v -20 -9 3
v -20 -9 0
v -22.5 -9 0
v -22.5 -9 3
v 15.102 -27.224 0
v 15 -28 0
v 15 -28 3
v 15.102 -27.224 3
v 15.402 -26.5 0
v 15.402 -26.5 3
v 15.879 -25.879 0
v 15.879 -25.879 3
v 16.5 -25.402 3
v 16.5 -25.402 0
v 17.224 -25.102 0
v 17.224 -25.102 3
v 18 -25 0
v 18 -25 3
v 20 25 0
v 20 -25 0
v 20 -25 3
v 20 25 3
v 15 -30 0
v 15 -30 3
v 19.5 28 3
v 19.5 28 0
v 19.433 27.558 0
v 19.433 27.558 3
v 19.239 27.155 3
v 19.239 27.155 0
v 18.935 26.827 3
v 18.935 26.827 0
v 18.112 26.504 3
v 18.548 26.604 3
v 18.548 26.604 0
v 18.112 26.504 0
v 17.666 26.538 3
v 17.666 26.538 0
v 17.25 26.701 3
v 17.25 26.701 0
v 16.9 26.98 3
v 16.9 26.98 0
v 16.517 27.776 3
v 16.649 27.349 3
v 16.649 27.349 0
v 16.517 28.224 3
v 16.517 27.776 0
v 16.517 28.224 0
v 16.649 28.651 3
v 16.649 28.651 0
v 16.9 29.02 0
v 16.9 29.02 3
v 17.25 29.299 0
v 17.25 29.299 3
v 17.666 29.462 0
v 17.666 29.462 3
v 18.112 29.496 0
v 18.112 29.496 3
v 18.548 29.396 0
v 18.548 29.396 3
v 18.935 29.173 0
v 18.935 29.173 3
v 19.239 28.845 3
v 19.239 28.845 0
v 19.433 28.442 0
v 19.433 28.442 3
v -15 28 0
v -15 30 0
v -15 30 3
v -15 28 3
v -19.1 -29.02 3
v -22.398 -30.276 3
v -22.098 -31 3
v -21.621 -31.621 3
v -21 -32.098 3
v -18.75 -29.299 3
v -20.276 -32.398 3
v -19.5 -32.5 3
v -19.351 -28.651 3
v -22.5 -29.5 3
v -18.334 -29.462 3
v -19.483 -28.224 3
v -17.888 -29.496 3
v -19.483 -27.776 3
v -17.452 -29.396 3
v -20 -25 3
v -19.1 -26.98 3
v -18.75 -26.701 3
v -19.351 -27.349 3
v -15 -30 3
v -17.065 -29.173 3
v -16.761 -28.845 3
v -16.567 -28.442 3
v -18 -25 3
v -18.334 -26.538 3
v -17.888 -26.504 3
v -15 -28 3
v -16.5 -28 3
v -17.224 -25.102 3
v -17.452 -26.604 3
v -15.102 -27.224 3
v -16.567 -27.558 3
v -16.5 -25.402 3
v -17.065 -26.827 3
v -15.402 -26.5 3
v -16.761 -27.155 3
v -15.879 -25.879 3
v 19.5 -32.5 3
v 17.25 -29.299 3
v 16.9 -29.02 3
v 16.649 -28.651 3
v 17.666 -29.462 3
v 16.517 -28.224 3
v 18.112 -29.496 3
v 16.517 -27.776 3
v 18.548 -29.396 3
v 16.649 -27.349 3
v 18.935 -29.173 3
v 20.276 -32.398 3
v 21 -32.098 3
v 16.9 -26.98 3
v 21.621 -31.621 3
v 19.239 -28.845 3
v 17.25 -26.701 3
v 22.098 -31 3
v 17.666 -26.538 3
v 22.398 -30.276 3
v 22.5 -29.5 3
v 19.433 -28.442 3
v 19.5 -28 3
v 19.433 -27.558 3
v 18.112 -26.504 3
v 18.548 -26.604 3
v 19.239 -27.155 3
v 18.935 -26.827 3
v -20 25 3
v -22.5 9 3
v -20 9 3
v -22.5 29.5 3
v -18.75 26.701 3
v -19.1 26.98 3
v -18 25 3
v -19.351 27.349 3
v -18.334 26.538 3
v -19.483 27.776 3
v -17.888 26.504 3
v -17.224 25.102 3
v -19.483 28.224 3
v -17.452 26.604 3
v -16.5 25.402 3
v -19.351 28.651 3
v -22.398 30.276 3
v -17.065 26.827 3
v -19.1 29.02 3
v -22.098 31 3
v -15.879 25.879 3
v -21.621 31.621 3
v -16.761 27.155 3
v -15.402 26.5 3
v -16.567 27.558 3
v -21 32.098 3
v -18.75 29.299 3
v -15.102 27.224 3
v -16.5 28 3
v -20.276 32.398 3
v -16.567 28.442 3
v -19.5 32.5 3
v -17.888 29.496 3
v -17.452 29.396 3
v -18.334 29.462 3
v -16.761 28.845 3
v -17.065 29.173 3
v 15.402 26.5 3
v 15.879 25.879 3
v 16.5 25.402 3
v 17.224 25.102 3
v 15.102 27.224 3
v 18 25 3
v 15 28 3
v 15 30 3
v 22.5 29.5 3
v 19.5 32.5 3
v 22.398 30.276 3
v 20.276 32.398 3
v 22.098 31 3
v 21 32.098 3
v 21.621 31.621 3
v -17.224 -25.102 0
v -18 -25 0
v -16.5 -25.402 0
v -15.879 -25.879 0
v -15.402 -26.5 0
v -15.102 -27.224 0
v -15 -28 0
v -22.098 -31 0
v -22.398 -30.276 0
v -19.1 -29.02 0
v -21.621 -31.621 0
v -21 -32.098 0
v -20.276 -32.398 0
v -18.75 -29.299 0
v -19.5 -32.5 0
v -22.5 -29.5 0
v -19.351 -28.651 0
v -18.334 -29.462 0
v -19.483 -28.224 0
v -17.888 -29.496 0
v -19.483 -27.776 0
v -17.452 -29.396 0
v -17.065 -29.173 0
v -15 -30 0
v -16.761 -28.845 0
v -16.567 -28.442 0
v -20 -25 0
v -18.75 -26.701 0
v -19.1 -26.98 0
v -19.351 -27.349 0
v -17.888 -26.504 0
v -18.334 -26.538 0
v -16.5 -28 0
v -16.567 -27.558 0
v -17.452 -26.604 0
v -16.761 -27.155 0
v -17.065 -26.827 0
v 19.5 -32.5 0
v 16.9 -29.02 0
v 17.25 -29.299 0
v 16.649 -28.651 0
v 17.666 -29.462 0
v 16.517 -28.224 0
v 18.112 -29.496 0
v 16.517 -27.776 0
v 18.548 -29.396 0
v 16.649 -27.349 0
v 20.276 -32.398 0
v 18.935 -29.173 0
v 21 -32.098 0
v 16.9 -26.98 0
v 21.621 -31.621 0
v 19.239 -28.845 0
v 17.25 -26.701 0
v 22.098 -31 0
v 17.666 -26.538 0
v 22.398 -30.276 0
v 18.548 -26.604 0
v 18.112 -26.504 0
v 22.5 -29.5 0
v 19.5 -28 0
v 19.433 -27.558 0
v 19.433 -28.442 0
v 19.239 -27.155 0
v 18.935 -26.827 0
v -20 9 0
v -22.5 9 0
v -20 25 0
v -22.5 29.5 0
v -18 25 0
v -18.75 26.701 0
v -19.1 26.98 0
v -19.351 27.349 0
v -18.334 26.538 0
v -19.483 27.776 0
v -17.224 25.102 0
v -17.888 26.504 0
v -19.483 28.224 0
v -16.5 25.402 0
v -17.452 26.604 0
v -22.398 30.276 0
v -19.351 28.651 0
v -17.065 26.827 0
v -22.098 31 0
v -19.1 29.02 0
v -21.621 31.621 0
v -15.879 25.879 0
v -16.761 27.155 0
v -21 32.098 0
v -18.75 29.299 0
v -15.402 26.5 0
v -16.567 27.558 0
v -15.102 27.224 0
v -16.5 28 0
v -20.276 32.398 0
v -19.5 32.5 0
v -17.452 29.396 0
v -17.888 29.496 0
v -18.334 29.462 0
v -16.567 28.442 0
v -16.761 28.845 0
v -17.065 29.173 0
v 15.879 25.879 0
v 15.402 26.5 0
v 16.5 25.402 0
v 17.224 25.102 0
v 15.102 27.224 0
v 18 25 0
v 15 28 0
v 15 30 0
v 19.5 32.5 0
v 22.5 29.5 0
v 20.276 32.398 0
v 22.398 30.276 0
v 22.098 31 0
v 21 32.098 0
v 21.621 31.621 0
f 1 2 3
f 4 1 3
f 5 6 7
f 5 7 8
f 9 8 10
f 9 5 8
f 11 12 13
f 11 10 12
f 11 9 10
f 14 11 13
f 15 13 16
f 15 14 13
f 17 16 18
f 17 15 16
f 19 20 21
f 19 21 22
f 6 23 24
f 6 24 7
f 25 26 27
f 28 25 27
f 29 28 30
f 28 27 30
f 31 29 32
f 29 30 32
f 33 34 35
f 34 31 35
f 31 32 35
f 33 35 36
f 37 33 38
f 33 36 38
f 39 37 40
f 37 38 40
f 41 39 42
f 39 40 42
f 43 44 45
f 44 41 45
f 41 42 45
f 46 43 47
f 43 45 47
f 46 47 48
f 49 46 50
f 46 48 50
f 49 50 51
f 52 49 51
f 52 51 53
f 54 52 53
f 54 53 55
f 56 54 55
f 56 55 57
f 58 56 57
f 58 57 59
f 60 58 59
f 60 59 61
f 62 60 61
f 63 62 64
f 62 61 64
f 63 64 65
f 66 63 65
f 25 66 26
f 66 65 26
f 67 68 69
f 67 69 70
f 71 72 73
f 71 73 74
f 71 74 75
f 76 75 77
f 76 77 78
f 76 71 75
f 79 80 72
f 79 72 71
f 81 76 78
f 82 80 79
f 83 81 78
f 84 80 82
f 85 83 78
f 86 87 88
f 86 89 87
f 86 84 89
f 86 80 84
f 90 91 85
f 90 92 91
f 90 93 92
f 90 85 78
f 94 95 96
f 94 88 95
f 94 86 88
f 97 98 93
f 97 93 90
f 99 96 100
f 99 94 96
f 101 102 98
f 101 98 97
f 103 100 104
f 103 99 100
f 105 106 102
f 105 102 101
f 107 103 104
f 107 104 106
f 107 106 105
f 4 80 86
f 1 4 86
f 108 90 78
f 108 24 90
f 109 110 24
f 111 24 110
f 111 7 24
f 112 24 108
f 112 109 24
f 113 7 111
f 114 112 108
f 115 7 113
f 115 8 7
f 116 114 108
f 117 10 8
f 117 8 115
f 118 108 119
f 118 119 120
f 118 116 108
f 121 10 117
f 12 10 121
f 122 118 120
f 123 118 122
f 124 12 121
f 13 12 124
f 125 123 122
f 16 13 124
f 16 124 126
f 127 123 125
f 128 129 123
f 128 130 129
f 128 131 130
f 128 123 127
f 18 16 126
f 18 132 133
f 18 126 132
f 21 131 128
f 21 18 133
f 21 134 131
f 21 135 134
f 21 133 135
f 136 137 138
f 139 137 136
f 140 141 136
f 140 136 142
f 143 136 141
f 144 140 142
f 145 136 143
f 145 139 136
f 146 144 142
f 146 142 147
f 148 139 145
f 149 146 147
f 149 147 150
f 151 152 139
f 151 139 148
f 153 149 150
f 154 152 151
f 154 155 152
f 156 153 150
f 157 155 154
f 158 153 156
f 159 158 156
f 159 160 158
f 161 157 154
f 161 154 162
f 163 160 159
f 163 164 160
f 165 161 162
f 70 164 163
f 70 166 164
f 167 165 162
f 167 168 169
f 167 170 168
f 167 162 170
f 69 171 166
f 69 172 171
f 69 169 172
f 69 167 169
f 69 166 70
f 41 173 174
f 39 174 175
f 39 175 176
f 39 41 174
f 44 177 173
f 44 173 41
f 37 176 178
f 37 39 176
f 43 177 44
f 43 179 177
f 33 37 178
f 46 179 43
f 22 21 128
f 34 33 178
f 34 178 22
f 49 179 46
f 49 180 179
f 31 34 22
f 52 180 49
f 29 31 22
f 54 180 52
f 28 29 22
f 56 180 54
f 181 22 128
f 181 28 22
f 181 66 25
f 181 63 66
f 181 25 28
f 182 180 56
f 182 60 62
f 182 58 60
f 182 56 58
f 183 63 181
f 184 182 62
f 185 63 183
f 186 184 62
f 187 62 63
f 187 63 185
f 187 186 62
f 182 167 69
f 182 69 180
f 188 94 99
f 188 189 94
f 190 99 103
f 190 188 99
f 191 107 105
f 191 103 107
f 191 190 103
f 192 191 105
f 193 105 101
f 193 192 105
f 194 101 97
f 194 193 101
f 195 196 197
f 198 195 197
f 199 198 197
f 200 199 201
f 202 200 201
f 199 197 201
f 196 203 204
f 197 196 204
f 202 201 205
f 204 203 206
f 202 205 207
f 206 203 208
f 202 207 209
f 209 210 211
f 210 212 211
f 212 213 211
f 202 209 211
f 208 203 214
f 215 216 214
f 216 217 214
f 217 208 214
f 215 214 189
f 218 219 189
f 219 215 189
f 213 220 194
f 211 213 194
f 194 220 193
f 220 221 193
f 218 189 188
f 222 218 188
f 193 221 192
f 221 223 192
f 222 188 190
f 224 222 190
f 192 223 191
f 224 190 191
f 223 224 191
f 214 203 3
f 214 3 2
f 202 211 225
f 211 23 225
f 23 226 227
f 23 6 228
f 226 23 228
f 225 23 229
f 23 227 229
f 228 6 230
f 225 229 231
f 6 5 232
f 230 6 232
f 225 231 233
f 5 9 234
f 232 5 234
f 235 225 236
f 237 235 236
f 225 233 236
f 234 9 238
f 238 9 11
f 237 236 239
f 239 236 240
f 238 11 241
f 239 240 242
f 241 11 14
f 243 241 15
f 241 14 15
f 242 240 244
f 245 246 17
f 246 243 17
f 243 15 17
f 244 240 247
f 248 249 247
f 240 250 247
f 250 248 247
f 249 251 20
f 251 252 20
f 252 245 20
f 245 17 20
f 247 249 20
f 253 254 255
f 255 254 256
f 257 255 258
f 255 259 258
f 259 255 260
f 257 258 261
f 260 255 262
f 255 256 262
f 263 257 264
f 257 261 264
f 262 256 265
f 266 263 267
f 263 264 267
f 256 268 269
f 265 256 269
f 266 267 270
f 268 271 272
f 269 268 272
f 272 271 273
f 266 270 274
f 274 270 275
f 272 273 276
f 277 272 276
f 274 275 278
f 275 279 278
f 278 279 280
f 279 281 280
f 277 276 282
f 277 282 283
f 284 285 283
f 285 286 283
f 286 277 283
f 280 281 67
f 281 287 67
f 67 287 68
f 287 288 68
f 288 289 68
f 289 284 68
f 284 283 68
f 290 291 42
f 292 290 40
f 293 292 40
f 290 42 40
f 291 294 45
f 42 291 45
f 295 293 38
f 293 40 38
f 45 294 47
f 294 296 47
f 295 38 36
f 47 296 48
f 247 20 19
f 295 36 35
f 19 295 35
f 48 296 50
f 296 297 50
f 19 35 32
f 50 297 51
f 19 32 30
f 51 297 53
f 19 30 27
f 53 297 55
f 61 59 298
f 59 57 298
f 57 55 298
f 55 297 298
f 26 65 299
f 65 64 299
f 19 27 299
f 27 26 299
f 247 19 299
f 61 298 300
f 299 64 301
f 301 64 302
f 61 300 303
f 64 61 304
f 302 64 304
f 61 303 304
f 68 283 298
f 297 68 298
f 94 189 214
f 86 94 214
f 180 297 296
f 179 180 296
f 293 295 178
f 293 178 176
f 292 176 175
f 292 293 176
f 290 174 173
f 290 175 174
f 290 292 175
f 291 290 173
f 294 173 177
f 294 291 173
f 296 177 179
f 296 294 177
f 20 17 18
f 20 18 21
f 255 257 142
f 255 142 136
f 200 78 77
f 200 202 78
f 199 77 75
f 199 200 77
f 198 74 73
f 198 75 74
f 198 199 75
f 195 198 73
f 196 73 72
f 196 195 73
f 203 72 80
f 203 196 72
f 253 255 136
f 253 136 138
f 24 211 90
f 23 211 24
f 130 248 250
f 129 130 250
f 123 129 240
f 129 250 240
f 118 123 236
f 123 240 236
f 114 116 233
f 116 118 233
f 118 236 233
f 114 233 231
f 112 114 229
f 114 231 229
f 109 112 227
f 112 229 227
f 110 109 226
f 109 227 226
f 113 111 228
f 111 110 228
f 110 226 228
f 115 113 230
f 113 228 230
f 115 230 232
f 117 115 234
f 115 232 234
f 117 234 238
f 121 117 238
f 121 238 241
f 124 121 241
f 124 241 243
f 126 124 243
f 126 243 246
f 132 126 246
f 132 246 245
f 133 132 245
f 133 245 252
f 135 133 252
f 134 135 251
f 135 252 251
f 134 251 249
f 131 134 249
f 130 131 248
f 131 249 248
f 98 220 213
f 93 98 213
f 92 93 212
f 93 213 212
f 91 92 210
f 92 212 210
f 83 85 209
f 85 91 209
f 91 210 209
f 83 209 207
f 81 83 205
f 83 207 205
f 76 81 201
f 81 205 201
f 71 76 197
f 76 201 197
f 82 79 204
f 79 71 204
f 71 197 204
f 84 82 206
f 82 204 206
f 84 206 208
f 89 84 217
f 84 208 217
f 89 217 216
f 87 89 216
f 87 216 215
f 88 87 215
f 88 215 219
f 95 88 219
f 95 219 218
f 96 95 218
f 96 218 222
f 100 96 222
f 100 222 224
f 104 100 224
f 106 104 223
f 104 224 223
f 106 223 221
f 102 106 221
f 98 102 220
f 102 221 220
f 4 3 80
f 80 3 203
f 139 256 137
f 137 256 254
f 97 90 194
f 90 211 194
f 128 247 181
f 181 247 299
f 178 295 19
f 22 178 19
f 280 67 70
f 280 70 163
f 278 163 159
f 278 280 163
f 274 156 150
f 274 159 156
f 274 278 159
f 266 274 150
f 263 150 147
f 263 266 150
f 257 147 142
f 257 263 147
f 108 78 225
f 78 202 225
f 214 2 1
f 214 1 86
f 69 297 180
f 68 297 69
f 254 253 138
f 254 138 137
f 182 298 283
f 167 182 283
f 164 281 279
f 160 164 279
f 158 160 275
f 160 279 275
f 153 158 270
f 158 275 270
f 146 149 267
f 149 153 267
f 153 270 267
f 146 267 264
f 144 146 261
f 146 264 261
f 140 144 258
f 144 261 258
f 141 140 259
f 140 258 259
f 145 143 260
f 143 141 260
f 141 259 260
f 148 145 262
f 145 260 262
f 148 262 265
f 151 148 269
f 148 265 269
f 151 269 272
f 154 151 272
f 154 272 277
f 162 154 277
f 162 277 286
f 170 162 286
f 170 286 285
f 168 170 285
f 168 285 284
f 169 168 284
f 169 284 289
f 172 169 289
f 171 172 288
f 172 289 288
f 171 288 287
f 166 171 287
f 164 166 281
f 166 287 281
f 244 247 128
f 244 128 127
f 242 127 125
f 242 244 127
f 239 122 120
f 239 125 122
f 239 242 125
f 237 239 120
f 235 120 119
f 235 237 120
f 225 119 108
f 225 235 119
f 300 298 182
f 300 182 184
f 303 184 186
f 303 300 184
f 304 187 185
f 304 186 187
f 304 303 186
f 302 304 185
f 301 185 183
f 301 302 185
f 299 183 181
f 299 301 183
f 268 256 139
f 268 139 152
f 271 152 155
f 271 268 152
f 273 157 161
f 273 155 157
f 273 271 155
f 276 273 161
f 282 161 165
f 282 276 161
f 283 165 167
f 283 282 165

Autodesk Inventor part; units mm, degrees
ref_plane "YZ Plane" through (0, 0, 0) normal (1, 0, 0) x (0, 1, 0)
ref_plane "XZ Plane" through (0, 0, 0) normal (0, 1, 0) x (-1, 0, 0)
ref_plane "XY Plane" through (0, 0, 0) normal (0, 0, 1) x (1, 0, 0)
sketch "Эскиз1" plane through (0, 0, 0) normal (0, 0, 1) x (1, 0, 0)
  line L0 (19.5, 32.5) -> (-19.5, 32.5)
  line L1 (-22.5, 29.5) -> (-22.5, -29.5)
  line L2 (-19.5, -32.5) -> (19.5, -32.5)
  line L3 (22.5, -29.5) -> (22.5, 29.5)
  line L4 (22.5, 32.5) -> (-22.5, -32.5) construction
  line L5 (-22.5, 32.5) -> (22.5, -32.5) construction
  circle A0 centre (18, 28) radius 1.5 projected
  circle A1 centre (18, -28) radius 1.5 projected
  circle A2 centre (-18, -28) radius 1.5 projected
  circle A3 centre (-18, 28) radius 1.5 projected
  arc A4 (22.5, 29.5) -> (19.5, 32.5) centre (19.5, 29.5) ccw
  arc A5 (19.5, -32.5) -> (22.5, -29.5) centre (19.5, -29.5) ccw
  arc A6 (-22.5, -29.5) -> (-19.5, -32.5) centre (-19.5, -29.5) ccw
  arc A7 (-19.5, 32.5) -> (-22.5, 29.5) centre (-19.5, 29.5) ccw
  line L6 (20, -30) -> (20, 30) projected
  line L7 (20, 30) -> (-20, 30) projected
  line L8 (-20, 30) -> (-20, 9) projected
  line L9 (-20, -9) -> (-20, -30) projected
  line L10 (-20, -30) -> (20, -30) projected
  line L11 (20, -30) -> (15, -30)
  line L12 (15, -30) -> (15, -28)
  line L13 (18, -25) -> (20, -25)
  line L14 (20, -25) -> (20, -30)
  arc A8 (18, -25) -> (15, -28) centre (18, -28) ccw
  line L15 (20, 30) -> (15, 30)
  line L16 (15, 30) -> (15, 28)
  line L17 (18, 25) -> (20, 25)
  line L18 (20, 25) -> (20, 30)
  line L19 (-20, 30) -> (-15, 30)
  line L20 (-15, 30) -> (-15, 28)
  line L21 (-18, 25) -> (-20, 25)
  line L22 (-20, 25) -> (-20, 30)
  line L23 (-20, -30) -> (-15, -30)
  line L24 (-15, -30) -> (-15, -28)
  line L25 (-18, -25) -> (-20, -25)
  line L26 (-20, -25) -> (-20, -30)
  arc A9 (15, 28) -> (18, 25) centre (18, 28) ccw
  arc A10 (-18, 25) -> (-15, 28) centre (-18, 28) ccw
  arc A11 (-15, -28) -> (-18, -25) centre (-18, -28) ccw
  line L27 (-20, 9) -> (-22.5, 9)
  line L28 (-20, -9) -> (-22.5, -9)
  point P0 (0, 0)
  point P1 (15, -25)
  point P2 (15, 25)
  point P3 (-15, 25)
  point P4 (-15, -25)
  dimension "d0" = 45
  dimension "d1" = 65
  dimension "d2" = 3
  dimension "d3" = 5
  dimension "d4" = 5
  dimension "d5" = 3
  dimension "d6" = 5
  dimension "d7" = 5
  dimension "d8" = 5
  dimension "d9" = 5
  dimension "d10" = 5
  dimension "d11" = 3
extrude "Выдавливание1" add sketch "Эскиз1" along normal blind 3 contours A4 L3 A5 L2 A6 L1 L28 L9 L10 L6 L7 L8 L27 A7 L0 | L8 L7 L20 A10 L21 | L25 A11 L24 L10 L9 | L7 L6 L17 A9 L16 | L12 A8 L13 L6 L10
properties part number "level1_up"
